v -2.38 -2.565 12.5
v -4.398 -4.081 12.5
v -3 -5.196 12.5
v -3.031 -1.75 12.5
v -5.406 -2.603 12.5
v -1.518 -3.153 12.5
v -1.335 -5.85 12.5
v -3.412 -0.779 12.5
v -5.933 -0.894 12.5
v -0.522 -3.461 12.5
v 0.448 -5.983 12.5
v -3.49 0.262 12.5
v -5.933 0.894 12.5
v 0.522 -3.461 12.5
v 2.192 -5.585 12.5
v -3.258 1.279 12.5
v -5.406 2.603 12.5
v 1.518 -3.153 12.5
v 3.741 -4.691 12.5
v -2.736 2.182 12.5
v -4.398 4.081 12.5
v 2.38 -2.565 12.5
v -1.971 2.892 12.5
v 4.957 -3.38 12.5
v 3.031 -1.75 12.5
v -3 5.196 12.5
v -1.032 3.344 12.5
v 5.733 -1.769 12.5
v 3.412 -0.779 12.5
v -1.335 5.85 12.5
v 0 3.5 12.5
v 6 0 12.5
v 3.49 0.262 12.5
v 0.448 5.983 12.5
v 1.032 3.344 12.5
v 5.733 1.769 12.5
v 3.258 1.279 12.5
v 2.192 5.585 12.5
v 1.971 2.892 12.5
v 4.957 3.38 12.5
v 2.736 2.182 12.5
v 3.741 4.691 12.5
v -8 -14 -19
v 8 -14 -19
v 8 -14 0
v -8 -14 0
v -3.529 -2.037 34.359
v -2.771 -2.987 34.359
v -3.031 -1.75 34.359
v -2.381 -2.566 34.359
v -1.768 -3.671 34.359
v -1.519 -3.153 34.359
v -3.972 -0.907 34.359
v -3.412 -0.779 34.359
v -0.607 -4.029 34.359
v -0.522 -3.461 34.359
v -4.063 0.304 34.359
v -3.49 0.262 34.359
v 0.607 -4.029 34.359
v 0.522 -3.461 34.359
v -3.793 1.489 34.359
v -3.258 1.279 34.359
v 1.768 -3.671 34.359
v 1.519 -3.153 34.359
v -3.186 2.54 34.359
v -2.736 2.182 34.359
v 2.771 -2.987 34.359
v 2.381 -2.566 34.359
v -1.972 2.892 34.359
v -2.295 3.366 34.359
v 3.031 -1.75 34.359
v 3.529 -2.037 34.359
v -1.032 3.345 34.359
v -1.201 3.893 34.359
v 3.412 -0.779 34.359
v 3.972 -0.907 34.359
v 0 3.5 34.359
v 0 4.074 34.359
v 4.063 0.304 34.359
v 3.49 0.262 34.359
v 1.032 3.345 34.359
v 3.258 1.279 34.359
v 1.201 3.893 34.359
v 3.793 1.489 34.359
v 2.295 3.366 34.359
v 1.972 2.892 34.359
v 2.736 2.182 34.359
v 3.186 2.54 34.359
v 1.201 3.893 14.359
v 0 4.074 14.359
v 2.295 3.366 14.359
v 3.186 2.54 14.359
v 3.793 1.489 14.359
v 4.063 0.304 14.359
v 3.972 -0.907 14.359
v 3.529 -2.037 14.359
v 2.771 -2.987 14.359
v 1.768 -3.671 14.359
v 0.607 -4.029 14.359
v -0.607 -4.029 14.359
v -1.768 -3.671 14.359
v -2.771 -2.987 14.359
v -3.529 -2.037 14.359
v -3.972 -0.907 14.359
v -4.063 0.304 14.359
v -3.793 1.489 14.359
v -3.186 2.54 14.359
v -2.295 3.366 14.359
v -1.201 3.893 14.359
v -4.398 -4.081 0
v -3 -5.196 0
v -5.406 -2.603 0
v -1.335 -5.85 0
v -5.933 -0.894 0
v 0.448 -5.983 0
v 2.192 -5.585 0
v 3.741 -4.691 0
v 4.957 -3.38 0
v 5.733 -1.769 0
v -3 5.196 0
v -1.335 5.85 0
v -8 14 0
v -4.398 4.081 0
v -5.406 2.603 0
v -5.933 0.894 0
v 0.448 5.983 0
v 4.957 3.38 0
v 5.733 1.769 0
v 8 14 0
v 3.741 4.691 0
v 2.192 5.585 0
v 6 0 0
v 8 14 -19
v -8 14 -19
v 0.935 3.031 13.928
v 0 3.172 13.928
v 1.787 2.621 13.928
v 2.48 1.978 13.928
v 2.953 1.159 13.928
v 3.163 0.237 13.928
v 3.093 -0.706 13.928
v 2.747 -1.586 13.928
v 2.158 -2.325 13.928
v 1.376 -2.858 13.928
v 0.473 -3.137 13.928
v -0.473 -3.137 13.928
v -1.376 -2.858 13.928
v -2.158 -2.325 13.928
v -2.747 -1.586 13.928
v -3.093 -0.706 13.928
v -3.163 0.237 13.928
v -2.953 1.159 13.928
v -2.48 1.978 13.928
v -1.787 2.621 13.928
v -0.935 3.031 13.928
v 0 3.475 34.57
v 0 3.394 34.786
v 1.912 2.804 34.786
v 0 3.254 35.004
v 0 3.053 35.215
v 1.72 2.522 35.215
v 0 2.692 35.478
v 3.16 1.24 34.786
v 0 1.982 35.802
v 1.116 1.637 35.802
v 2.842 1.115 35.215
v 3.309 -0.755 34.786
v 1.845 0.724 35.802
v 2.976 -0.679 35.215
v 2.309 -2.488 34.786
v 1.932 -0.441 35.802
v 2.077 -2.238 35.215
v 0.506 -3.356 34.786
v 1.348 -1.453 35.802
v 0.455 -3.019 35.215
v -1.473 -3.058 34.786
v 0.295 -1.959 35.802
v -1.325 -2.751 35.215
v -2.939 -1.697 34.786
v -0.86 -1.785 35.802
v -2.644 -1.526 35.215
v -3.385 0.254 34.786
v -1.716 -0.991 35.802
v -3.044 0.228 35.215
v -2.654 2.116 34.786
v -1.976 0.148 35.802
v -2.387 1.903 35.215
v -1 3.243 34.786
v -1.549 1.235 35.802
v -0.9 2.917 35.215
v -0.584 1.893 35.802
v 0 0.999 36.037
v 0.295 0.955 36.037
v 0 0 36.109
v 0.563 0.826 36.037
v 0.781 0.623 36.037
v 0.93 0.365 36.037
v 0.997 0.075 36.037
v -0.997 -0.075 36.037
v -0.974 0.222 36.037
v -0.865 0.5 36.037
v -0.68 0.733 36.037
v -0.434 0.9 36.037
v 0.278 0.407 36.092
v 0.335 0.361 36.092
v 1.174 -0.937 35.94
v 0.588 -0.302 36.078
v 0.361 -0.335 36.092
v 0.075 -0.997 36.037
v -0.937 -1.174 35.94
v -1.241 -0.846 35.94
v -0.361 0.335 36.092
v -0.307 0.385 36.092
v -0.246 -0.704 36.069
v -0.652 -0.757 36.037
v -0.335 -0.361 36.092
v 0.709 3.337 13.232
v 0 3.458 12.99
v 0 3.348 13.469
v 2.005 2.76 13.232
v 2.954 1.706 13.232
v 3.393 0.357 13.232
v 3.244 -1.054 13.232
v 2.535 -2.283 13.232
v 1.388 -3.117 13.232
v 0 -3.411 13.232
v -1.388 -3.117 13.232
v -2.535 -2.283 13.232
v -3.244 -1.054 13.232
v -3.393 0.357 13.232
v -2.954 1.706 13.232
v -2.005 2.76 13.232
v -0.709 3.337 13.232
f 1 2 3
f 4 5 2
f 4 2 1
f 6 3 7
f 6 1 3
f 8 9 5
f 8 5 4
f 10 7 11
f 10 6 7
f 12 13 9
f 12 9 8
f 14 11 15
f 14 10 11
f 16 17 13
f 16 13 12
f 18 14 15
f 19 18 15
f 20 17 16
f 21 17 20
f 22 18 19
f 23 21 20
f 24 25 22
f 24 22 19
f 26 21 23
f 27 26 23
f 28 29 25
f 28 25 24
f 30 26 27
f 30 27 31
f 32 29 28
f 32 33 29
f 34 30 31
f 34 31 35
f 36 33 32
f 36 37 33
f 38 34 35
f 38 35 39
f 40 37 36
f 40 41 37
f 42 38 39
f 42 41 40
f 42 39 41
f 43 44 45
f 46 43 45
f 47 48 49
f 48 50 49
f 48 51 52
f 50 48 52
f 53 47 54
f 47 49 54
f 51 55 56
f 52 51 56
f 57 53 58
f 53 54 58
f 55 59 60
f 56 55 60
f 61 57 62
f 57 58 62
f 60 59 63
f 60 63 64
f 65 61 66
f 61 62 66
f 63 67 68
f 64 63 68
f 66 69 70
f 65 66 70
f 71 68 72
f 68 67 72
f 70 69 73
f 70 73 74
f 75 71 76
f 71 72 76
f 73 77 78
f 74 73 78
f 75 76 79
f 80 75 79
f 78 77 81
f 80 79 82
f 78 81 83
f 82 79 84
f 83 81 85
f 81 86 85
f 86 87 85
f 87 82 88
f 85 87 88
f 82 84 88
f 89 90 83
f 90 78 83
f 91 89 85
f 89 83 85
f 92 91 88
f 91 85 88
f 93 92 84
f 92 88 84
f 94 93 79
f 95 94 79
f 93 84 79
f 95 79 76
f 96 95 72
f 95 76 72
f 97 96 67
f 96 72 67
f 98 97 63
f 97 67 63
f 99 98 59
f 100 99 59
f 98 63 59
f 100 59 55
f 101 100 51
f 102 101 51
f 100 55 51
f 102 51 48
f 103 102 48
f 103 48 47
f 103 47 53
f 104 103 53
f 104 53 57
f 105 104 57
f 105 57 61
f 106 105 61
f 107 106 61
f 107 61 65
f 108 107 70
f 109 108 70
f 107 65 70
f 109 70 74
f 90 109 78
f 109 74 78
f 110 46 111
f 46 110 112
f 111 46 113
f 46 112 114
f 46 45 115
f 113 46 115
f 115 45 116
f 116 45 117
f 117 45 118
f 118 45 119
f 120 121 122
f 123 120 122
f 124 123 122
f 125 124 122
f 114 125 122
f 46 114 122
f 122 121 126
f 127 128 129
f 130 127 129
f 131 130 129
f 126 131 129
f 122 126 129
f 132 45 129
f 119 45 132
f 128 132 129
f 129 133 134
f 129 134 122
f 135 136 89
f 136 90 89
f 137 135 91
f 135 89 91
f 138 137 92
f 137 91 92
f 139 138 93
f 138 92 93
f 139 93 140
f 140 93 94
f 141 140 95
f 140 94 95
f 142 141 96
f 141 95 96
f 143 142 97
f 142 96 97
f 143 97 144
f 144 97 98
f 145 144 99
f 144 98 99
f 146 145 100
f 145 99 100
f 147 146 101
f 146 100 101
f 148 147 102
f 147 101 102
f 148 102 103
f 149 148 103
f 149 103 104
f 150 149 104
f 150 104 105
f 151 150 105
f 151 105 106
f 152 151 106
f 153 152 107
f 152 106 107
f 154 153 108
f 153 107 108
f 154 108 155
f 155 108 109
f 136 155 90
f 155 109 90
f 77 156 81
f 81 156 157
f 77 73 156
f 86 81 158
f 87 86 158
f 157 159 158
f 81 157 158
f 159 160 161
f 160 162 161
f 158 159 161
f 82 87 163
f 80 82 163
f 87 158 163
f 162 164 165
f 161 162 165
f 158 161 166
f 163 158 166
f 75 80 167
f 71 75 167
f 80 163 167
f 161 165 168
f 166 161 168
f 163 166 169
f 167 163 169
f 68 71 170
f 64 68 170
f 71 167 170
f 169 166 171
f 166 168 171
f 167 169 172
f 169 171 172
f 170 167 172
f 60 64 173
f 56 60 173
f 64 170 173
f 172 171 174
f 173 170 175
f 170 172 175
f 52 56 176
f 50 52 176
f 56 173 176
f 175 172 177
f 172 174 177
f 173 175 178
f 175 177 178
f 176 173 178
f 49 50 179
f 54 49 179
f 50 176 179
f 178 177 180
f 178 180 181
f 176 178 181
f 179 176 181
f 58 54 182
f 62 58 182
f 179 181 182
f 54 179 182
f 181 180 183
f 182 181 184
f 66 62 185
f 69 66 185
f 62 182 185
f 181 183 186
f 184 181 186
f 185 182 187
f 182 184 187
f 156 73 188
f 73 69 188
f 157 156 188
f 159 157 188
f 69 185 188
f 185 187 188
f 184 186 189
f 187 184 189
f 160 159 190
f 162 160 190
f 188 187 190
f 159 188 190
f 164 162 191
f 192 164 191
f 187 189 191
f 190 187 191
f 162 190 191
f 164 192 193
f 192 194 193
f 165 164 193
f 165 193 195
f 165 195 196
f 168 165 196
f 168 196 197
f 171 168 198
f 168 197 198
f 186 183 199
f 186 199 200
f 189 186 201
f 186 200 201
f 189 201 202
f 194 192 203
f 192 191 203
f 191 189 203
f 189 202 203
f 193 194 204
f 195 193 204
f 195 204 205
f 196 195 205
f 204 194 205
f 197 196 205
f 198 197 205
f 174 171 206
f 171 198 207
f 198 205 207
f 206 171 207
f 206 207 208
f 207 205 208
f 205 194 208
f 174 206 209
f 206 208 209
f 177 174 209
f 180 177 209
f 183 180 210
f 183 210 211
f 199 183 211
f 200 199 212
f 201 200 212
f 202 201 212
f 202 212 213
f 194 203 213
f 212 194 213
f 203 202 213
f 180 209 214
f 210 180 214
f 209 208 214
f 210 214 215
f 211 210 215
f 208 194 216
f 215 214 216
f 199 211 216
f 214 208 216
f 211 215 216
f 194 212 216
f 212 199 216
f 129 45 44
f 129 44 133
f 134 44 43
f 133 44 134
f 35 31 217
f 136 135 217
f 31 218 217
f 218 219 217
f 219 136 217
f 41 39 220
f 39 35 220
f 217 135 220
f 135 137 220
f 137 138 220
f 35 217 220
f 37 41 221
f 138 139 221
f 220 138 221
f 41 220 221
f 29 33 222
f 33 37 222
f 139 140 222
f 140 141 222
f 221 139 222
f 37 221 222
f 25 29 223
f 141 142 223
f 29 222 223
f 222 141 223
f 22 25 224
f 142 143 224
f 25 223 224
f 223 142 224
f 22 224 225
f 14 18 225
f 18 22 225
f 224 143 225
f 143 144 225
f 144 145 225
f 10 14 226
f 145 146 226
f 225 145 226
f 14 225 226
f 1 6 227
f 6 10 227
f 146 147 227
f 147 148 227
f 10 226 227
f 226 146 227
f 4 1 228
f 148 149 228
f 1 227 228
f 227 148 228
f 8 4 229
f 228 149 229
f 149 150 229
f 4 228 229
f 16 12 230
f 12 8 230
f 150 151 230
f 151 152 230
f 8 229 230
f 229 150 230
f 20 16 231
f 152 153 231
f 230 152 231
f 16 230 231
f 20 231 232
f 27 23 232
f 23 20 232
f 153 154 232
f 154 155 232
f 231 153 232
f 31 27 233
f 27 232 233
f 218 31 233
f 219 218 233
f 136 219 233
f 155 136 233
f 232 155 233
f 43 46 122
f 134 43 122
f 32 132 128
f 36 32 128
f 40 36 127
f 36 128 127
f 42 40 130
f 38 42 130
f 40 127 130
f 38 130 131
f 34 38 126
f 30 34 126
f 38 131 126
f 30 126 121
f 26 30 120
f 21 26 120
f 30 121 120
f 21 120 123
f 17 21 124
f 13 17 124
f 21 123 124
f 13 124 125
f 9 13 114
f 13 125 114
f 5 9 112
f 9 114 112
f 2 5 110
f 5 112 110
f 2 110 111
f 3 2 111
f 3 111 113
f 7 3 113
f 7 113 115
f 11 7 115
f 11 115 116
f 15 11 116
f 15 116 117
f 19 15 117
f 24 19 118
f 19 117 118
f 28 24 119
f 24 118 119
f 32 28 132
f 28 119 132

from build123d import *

# Parameters (mm, degrees)
F0_R     = 6
F1_DEPTH = 12.5
F2_W     = 28
F2_H     = 19
F3_DEPTH = 8


with BuildPart() as f1:
    # F0 (on Top) → F1 (new body)
    with BuildSketch(Plane.XY):
        Circle(F0_R)
    extrude(amount=F1_DEPTH)

    # F2 (on Right) → F3 (join, symmetric)
    with BuildSketch(Plane.YZ):
        with Locations((0, -9.5)):
            Rectangle(F2_W, F2_H)
    extrude(amount=F3_DEPTH, both=True)

    # F2 (on Right) → F4 (revolve)
    with BuildSketch(Plane.YZ):
        with BuildLine():
            ThreePointArc((0, 15.9491937459), (1.8805486292, 15.4010638062), (3.1720772546, 13.9283576619))
            Line((3.1720772546, 13.9283576619), (4.0744187722, 14.3593794546))
            Line((4.0744187722, 14.3593794546), (4.0744187722, 34.3593794546))
            Line((4.0744187722, 34.3593794546), (3.5, 34.3593794546))
            add(Edge.make_bspline(
                [(0, 32.6093794546), (3.5, 32.6093794546), (3.5, 34.3593794546)],
                knots=[4.7123889804, 4.7123889804, 4.7123889804, 6.2831853072, 6.2831853072, 6.2831853072], degree=2, weights=[1, 0.7071067812, 1]))
            Line((0, 32.6093794546), (0, 15.9491937459))
        make_face()
        with BuildLine():
            Line((0, 12.4491937459), (3.5, 12.4491937459))
            ThreePointArc((3.5, 12.4491937459), (3.4170360249, 13.2067323946), (3.1720772546, 13.9283576619))
            ThreePointArc((3.1720772546, 13.9283576619), (1.8805486292, 15.4010638062), (0, 15.9491937459))
            Line((0, 15.9491937459), (0, 12.4491937459))
        make_face()
        with BuildLine():
            Line((0, 34.3593794546), (0, 32.6093794546))
            add(Edge.make_bspline(
                [(0, 32.6093794546), (3.5, 32.6093794546), (3.5, 34.3593794546)],
                knots=[4.7123889804, 4.7123889804, 4.7123889804, 6.2831853072, 6.2831853072, 6.2831853072], degree=2, weights=[1, 0.7071067812, 1]))
            Line((3.5, 34.3593794546), (0, 34.3593794546))
        make_face()
        with BuildLine():
            Line((0, 36.1093794546), (0, 34.3593794546))
            Line((0, 34.3593794546), (3.5, 34.3593794546))
            add(Edge.make_bspline(
                [(3.5, 34.3593794546), (3.5, 36.1093794546), (0, 36.1093794546)],
                knots=[0, 0, 0, 1.5707963268, 1.5707963268, 1.5707963268], degree=2, weights=[1, 0.7071067812, 1]))
        make_face()
        with BuildLine():
            ThreePointArc((0, 8.9491937459), (2.4748737342, 9.9743200117), (3.5, 12.4491937459))
            Line((3.5, 12.4491937459), (0, 12.4491937459))
            Line((0, 12.4491937459), (0, 8.9491937459))
        make_face()
    revolve(axis=Axis((0, 0, 25.1542866002), (0, 0, -1)))


solid = f1.part
